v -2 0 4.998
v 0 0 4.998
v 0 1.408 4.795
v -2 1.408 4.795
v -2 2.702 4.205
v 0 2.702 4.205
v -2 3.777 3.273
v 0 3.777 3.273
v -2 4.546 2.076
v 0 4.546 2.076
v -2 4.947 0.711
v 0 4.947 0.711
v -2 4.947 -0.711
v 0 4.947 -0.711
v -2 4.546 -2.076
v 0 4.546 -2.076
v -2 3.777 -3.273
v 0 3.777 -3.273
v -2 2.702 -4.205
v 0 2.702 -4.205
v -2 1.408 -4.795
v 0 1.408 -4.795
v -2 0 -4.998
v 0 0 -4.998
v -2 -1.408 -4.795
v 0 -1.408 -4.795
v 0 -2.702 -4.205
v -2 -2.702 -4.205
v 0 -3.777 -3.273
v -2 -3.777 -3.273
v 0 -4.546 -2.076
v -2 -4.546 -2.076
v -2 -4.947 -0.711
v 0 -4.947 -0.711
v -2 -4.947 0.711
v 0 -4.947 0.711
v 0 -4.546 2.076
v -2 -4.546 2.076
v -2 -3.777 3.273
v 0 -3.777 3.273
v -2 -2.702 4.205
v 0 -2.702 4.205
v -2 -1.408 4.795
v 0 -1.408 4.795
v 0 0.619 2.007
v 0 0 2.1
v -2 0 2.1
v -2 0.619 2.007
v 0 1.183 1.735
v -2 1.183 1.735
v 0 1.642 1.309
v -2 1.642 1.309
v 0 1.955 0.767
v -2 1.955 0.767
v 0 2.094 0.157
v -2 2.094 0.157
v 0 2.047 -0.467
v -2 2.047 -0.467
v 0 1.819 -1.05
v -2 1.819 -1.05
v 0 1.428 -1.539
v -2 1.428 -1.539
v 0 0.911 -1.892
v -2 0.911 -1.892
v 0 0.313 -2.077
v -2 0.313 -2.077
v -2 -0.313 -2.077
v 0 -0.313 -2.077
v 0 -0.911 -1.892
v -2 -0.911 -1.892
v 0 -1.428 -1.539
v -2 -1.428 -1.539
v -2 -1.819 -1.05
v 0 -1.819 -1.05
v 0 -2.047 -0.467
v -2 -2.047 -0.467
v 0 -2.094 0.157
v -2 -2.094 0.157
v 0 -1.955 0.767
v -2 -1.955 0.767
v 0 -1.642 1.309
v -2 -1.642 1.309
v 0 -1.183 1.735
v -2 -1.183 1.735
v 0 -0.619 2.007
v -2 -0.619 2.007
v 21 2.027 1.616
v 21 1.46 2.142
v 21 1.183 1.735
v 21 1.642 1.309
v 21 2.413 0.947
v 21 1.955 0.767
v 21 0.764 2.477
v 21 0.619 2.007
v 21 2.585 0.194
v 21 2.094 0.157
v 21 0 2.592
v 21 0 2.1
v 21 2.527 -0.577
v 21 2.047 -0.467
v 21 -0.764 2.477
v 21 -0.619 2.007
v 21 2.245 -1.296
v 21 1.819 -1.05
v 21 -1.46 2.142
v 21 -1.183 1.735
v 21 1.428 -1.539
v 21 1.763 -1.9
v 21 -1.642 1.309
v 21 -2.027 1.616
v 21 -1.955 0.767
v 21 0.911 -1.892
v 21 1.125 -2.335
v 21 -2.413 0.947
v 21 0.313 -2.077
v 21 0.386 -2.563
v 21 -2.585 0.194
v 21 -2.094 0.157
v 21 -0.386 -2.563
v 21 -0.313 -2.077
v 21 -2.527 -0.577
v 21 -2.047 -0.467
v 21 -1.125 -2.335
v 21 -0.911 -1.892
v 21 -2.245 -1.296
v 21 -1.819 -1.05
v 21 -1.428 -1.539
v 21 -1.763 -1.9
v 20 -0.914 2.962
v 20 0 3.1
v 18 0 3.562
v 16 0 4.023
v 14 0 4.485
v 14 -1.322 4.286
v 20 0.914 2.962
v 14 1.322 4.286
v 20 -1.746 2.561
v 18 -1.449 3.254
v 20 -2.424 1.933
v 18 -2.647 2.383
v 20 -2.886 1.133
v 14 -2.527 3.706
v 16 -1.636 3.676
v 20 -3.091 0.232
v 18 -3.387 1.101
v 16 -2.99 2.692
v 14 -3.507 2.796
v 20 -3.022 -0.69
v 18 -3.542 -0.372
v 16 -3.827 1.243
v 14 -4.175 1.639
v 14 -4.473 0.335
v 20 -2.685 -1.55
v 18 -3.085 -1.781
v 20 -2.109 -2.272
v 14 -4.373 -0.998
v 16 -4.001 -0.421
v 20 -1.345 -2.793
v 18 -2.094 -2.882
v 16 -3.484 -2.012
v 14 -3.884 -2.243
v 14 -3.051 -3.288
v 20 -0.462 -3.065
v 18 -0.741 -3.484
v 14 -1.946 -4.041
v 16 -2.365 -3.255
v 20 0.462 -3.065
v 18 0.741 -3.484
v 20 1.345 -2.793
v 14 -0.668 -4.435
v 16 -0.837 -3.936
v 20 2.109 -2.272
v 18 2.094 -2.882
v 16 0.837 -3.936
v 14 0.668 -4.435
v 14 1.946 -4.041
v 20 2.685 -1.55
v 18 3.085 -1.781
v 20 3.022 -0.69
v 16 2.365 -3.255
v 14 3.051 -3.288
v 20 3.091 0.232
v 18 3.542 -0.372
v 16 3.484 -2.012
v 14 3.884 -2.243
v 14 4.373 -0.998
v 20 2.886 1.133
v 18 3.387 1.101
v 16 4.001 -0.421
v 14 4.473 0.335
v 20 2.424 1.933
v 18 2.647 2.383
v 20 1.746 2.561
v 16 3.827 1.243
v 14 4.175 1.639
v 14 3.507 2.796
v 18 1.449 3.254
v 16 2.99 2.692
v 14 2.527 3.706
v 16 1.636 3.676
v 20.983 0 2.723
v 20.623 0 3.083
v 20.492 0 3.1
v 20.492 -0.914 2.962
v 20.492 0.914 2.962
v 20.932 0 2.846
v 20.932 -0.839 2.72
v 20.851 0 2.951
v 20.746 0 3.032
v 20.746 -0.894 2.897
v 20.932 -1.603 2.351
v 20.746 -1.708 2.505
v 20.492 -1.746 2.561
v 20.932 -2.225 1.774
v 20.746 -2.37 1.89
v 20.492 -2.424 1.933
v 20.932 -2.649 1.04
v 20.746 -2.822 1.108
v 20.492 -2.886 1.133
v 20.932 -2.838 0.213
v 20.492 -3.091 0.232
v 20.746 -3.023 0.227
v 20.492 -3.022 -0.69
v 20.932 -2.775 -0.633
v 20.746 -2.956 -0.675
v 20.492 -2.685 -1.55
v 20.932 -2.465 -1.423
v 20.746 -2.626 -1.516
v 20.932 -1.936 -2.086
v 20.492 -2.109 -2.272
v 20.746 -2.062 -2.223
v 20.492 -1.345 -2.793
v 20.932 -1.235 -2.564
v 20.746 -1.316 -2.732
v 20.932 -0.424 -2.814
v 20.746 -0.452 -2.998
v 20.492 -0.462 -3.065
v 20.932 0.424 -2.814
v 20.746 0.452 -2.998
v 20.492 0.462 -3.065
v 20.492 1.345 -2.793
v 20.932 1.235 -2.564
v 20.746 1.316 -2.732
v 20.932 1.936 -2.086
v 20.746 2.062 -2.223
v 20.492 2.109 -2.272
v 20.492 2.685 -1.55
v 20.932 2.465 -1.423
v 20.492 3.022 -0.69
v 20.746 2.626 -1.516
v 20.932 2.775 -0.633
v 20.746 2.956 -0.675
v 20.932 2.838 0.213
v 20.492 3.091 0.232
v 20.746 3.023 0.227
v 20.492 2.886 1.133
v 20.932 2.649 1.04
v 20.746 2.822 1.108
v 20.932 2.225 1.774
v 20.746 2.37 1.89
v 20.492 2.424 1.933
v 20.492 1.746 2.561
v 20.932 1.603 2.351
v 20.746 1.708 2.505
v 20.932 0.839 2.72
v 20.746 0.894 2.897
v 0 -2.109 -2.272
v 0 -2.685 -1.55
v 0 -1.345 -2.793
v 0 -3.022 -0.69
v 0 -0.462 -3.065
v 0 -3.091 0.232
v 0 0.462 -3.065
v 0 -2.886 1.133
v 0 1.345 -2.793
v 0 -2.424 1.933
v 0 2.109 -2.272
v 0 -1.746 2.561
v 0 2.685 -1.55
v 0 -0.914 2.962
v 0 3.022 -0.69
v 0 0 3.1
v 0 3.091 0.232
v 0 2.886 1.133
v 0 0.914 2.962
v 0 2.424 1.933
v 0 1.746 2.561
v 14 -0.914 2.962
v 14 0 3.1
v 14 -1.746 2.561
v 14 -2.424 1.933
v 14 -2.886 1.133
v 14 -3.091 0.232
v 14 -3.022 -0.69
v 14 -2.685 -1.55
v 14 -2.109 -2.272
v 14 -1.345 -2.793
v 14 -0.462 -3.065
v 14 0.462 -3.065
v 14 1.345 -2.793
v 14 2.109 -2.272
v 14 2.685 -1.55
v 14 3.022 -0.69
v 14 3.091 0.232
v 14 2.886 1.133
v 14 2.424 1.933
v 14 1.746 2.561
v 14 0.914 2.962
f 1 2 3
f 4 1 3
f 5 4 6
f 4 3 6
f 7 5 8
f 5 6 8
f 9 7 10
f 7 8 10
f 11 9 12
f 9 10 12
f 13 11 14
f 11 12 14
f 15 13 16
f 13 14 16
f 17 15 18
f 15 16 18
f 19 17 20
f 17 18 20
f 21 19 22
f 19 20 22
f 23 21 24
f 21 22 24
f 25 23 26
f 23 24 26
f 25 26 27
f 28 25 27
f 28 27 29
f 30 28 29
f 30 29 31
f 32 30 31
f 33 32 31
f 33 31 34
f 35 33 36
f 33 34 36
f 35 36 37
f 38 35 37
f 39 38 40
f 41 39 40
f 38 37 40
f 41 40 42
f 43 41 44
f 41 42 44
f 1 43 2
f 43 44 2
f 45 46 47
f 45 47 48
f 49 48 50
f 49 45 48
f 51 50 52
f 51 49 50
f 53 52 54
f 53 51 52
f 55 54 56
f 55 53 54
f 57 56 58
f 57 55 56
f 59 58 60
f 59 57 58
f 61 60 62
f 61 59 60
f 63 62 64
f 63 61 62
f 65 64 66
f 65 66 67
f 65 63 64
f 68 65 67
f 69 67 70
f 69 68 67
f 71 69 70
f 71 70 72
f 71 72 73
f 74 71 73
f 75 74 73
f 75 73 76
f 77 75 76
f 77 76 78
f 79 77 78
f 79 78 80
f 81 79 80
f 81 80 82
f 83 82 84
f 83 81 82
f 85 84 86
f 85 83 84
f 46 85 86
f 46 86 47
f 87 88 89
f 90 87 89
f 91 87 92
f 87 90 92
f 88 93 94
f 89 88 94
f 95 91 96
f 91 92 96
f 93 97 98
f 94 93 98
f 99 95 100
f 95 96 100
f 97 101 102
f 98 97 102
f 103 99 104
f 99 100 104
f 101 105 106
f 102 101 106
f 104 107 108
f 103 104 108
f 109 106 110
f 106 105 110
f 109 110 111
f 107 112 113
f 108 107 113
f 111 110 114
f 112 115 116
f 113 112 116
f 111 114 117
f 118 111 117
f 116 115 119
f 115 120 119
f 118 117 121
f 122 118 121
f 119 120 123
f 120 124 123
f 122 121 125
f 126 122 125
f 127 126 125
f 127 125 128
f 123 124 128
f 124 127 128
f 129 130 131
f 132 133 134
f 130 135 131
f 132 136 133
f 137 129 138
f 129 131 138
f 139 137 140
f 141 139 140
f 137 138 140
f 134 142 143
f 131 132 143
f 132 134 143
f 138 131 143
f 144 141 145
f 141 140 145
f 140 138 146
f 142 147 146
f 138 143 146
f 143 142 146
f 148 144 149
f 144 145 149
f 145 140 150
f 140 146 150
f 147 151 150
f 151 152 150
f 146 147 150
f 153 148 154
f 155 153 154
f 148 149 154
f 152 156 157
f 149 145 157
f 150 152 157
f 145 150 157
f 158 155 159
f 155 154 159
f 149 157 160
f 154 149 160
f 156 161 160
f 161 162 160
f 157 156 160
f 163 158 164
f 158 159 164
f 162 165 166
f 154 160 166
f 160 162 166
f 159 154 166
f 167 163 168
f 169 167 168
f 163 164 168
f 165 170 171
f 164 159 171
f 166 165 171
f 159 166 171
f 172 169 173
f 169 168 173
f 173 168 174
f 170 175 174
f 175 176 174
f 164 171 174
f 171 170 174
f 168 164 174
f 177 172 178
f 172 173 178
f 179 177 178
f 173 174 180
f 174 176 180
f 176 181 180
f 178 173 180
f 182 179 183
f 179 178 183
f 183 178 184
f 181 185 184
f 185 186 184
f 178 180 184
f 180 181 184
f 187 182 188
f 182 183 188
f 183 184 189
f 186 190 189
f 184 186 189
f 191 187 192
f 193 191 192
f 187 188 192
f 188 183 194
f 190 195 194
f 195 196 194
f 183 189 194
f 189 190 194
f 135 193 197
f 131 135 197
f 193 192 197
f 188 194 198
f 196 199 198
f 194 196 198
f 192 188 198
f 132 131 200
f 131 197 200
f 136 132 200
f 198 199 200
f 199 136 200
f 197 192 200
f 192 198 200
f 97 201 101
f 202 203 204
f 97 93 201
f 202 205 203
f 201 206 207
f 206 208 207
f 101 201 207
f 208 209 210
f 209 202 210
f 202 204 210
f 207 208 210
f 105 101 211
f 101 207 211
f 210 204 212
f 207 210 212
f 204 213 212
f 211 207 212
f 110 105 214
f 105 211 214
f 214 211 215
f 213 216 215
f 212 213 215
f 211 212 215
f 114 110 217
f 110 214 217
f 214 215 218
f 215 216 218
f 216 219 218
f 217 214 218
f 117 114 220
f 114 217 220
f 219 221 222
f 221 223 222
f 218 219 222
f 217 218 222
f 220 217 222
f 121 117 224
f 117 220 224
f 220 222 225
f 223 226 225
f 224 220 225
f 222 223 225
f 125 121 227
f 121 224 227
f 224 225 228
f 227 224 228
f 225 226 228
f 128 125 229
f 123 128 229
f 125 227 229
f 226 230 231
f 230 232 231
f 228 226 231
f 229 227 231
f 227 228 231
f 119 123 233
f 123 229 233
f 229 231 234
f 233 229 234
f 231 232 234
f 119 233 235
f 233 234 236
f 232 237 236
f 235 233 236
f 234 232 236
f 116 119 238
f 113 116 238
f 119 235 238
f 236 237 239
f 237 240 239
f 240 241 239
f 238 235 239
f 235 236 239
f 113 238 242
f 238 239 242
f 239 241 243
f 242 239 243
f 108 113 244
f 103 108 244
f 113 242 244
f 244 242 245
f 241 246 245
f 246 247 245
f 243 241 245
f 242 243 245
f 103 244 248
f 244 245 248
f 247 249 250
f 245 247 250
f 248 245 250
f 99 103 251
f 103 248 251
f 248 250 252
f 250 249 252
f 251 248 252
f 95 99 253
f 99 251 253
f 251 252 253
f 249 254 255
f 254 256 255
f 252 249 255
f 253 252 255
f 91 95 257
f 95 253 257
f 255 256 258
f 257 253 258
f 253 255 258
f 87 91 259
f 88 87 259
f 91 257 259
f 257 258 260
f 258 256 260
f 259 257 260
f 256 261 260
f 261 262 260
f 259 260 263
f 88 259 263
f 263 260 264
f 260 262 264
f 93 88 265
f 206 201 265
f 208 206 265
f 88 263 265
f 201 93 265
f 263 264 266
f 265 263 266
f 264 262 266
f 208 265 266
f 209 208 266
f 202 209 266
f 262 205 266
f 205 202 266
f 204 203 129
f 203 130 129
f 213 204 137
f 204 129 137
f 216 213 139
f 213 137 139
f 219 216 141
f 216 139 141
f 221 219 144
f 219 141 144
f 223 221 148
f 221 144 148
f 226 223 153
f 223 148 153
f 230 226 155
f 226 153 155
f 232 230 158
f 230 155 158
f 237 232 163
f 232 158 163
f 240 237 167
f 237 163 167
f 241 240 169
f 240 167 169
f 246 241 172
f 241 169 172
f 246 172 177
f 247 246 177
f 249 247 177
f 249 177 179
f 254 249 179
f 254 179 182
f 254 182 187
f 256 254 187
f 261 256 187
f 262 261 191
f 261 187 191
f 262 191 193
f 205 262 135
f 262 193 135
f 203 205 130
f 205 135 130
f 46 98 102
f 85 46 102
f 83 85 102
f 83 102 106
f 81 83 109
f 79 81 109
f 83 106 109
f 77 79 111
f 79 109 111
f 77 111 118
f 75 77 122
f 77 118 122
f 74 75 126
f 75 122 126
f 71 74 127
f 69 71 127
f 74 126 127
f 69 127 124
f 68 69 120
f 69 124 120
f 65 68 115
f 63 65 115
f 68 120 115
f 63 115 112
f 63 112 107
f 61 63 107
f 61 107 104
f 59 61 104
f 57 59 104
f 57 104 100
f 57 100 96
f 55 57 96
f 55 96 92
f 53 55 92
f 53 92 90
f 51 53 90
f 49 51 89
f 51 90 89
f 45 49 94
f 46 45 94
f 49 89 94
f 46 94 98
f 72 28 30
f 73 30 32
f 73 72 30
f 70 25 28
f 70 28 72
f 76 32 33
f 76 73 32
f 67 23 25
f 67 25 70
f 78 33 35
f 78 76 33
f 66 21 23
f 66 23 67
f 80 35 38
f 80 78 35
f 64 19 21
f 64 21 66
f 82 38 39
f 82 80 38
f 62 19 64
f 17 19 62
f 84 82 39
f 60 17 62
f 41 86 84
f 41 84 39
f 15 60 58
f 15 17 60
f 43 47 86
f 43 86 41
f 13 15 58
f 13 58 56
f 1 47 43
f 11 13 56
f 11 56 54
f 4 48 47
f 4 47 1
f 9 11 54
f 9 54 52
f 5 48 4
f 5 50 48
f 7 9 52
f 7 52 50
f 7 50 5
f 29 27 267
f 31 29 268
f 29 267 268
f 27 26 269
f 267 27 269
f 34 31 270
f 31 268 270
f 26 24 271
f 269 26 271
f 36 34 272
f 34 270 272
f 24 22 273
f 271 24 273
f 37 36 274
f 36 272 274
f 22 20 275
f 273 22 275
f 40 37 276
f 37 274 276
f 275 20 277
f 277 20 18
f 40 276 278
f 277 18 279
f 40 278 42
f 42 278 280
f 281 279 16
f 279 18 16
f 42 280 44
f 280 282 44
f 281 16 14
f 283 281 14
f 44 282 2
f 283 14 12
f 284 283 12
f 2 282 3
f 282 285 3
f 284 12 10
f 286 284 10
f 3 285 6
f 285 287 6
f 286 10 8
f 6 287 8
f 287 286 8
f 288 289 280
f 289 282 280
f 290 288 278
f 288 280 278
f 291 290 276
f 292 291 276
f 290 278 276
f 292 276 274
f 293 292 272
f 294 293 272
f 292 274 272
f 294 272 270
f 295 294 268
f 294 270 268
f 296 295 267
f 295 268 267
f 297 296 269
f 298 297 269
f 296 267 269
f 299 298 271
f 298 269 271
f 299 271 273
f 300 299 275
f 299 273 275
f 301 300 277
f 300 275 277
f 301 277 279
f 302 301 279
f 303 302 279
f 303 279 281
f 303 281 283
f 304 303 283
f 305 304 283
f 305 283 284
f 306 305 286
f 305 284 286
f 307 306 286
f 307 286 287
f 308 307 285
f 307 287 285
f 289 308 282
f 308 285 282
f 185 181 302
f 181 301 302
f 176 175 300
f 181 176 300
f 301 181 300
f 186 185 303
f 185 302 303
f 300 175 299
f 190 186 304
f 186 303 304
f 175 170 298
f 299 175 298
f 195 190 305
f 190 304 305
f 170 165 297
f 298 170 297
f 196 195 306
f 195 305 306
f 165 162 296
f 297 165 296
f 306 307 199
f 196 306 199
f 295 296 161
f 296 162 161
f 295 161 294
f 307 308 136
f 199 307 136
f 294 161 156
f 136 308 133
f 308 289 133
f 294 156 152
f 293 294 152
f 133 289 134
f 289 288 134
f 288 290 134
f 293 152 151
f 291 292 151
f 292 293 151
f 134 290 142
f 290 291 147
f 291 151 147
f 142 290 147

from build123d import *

# Parameters (mm, degrees)
SKETCH2_R           = 4.997903731
SKETCH2_R_2         = 2.1
BOSS_EXTRUDE1_DEPTH = 2


with BuildPart() as part:
    # Sketch1 → Revolve2 (revolve)
    with BuildSketch(Plane.XY, mode=Mode.PRIVATE) as revolve2_sk:
        with BuildLine():
            Line((0, 2.1), (8.384411392, 2.1))
            Line((8.384411392, 2.1), (21, 2.1))
            Line((21, 2.1), (21, 2.592))
            ThreePointArc((21, 2.592), (20.851210245, 2.951210245), (20.492, 3.1))
            Line((20.492, 3.1), (20, 3.1))
            Line((20, 3.1), (14, 4.485209147))
            Line((14, 4.485209147), (14, 3.1))
            Line((14, 3.1), (0, 3.1))
            Line((0, 3.1), (0, 2.1))
        make_face()
    revolve(revolve2_sk.sketch.rotate(Axis((0, 0, 0), (1, 0, 0)), 90), axis=Axis((0, 0, 0), (1, 0, 0)))

    # Sketch2 → Boss-Extrude1 (add)
    with BuildSketch(Plane.ZY):
        Circle(SKETCH2_R)
        Circle(SKETCH2_R_2, mode=Mode.SUBTRACT)
    extrude(amount=BOSS_EXTRUDE1_DEPTH)


solid = part.part
